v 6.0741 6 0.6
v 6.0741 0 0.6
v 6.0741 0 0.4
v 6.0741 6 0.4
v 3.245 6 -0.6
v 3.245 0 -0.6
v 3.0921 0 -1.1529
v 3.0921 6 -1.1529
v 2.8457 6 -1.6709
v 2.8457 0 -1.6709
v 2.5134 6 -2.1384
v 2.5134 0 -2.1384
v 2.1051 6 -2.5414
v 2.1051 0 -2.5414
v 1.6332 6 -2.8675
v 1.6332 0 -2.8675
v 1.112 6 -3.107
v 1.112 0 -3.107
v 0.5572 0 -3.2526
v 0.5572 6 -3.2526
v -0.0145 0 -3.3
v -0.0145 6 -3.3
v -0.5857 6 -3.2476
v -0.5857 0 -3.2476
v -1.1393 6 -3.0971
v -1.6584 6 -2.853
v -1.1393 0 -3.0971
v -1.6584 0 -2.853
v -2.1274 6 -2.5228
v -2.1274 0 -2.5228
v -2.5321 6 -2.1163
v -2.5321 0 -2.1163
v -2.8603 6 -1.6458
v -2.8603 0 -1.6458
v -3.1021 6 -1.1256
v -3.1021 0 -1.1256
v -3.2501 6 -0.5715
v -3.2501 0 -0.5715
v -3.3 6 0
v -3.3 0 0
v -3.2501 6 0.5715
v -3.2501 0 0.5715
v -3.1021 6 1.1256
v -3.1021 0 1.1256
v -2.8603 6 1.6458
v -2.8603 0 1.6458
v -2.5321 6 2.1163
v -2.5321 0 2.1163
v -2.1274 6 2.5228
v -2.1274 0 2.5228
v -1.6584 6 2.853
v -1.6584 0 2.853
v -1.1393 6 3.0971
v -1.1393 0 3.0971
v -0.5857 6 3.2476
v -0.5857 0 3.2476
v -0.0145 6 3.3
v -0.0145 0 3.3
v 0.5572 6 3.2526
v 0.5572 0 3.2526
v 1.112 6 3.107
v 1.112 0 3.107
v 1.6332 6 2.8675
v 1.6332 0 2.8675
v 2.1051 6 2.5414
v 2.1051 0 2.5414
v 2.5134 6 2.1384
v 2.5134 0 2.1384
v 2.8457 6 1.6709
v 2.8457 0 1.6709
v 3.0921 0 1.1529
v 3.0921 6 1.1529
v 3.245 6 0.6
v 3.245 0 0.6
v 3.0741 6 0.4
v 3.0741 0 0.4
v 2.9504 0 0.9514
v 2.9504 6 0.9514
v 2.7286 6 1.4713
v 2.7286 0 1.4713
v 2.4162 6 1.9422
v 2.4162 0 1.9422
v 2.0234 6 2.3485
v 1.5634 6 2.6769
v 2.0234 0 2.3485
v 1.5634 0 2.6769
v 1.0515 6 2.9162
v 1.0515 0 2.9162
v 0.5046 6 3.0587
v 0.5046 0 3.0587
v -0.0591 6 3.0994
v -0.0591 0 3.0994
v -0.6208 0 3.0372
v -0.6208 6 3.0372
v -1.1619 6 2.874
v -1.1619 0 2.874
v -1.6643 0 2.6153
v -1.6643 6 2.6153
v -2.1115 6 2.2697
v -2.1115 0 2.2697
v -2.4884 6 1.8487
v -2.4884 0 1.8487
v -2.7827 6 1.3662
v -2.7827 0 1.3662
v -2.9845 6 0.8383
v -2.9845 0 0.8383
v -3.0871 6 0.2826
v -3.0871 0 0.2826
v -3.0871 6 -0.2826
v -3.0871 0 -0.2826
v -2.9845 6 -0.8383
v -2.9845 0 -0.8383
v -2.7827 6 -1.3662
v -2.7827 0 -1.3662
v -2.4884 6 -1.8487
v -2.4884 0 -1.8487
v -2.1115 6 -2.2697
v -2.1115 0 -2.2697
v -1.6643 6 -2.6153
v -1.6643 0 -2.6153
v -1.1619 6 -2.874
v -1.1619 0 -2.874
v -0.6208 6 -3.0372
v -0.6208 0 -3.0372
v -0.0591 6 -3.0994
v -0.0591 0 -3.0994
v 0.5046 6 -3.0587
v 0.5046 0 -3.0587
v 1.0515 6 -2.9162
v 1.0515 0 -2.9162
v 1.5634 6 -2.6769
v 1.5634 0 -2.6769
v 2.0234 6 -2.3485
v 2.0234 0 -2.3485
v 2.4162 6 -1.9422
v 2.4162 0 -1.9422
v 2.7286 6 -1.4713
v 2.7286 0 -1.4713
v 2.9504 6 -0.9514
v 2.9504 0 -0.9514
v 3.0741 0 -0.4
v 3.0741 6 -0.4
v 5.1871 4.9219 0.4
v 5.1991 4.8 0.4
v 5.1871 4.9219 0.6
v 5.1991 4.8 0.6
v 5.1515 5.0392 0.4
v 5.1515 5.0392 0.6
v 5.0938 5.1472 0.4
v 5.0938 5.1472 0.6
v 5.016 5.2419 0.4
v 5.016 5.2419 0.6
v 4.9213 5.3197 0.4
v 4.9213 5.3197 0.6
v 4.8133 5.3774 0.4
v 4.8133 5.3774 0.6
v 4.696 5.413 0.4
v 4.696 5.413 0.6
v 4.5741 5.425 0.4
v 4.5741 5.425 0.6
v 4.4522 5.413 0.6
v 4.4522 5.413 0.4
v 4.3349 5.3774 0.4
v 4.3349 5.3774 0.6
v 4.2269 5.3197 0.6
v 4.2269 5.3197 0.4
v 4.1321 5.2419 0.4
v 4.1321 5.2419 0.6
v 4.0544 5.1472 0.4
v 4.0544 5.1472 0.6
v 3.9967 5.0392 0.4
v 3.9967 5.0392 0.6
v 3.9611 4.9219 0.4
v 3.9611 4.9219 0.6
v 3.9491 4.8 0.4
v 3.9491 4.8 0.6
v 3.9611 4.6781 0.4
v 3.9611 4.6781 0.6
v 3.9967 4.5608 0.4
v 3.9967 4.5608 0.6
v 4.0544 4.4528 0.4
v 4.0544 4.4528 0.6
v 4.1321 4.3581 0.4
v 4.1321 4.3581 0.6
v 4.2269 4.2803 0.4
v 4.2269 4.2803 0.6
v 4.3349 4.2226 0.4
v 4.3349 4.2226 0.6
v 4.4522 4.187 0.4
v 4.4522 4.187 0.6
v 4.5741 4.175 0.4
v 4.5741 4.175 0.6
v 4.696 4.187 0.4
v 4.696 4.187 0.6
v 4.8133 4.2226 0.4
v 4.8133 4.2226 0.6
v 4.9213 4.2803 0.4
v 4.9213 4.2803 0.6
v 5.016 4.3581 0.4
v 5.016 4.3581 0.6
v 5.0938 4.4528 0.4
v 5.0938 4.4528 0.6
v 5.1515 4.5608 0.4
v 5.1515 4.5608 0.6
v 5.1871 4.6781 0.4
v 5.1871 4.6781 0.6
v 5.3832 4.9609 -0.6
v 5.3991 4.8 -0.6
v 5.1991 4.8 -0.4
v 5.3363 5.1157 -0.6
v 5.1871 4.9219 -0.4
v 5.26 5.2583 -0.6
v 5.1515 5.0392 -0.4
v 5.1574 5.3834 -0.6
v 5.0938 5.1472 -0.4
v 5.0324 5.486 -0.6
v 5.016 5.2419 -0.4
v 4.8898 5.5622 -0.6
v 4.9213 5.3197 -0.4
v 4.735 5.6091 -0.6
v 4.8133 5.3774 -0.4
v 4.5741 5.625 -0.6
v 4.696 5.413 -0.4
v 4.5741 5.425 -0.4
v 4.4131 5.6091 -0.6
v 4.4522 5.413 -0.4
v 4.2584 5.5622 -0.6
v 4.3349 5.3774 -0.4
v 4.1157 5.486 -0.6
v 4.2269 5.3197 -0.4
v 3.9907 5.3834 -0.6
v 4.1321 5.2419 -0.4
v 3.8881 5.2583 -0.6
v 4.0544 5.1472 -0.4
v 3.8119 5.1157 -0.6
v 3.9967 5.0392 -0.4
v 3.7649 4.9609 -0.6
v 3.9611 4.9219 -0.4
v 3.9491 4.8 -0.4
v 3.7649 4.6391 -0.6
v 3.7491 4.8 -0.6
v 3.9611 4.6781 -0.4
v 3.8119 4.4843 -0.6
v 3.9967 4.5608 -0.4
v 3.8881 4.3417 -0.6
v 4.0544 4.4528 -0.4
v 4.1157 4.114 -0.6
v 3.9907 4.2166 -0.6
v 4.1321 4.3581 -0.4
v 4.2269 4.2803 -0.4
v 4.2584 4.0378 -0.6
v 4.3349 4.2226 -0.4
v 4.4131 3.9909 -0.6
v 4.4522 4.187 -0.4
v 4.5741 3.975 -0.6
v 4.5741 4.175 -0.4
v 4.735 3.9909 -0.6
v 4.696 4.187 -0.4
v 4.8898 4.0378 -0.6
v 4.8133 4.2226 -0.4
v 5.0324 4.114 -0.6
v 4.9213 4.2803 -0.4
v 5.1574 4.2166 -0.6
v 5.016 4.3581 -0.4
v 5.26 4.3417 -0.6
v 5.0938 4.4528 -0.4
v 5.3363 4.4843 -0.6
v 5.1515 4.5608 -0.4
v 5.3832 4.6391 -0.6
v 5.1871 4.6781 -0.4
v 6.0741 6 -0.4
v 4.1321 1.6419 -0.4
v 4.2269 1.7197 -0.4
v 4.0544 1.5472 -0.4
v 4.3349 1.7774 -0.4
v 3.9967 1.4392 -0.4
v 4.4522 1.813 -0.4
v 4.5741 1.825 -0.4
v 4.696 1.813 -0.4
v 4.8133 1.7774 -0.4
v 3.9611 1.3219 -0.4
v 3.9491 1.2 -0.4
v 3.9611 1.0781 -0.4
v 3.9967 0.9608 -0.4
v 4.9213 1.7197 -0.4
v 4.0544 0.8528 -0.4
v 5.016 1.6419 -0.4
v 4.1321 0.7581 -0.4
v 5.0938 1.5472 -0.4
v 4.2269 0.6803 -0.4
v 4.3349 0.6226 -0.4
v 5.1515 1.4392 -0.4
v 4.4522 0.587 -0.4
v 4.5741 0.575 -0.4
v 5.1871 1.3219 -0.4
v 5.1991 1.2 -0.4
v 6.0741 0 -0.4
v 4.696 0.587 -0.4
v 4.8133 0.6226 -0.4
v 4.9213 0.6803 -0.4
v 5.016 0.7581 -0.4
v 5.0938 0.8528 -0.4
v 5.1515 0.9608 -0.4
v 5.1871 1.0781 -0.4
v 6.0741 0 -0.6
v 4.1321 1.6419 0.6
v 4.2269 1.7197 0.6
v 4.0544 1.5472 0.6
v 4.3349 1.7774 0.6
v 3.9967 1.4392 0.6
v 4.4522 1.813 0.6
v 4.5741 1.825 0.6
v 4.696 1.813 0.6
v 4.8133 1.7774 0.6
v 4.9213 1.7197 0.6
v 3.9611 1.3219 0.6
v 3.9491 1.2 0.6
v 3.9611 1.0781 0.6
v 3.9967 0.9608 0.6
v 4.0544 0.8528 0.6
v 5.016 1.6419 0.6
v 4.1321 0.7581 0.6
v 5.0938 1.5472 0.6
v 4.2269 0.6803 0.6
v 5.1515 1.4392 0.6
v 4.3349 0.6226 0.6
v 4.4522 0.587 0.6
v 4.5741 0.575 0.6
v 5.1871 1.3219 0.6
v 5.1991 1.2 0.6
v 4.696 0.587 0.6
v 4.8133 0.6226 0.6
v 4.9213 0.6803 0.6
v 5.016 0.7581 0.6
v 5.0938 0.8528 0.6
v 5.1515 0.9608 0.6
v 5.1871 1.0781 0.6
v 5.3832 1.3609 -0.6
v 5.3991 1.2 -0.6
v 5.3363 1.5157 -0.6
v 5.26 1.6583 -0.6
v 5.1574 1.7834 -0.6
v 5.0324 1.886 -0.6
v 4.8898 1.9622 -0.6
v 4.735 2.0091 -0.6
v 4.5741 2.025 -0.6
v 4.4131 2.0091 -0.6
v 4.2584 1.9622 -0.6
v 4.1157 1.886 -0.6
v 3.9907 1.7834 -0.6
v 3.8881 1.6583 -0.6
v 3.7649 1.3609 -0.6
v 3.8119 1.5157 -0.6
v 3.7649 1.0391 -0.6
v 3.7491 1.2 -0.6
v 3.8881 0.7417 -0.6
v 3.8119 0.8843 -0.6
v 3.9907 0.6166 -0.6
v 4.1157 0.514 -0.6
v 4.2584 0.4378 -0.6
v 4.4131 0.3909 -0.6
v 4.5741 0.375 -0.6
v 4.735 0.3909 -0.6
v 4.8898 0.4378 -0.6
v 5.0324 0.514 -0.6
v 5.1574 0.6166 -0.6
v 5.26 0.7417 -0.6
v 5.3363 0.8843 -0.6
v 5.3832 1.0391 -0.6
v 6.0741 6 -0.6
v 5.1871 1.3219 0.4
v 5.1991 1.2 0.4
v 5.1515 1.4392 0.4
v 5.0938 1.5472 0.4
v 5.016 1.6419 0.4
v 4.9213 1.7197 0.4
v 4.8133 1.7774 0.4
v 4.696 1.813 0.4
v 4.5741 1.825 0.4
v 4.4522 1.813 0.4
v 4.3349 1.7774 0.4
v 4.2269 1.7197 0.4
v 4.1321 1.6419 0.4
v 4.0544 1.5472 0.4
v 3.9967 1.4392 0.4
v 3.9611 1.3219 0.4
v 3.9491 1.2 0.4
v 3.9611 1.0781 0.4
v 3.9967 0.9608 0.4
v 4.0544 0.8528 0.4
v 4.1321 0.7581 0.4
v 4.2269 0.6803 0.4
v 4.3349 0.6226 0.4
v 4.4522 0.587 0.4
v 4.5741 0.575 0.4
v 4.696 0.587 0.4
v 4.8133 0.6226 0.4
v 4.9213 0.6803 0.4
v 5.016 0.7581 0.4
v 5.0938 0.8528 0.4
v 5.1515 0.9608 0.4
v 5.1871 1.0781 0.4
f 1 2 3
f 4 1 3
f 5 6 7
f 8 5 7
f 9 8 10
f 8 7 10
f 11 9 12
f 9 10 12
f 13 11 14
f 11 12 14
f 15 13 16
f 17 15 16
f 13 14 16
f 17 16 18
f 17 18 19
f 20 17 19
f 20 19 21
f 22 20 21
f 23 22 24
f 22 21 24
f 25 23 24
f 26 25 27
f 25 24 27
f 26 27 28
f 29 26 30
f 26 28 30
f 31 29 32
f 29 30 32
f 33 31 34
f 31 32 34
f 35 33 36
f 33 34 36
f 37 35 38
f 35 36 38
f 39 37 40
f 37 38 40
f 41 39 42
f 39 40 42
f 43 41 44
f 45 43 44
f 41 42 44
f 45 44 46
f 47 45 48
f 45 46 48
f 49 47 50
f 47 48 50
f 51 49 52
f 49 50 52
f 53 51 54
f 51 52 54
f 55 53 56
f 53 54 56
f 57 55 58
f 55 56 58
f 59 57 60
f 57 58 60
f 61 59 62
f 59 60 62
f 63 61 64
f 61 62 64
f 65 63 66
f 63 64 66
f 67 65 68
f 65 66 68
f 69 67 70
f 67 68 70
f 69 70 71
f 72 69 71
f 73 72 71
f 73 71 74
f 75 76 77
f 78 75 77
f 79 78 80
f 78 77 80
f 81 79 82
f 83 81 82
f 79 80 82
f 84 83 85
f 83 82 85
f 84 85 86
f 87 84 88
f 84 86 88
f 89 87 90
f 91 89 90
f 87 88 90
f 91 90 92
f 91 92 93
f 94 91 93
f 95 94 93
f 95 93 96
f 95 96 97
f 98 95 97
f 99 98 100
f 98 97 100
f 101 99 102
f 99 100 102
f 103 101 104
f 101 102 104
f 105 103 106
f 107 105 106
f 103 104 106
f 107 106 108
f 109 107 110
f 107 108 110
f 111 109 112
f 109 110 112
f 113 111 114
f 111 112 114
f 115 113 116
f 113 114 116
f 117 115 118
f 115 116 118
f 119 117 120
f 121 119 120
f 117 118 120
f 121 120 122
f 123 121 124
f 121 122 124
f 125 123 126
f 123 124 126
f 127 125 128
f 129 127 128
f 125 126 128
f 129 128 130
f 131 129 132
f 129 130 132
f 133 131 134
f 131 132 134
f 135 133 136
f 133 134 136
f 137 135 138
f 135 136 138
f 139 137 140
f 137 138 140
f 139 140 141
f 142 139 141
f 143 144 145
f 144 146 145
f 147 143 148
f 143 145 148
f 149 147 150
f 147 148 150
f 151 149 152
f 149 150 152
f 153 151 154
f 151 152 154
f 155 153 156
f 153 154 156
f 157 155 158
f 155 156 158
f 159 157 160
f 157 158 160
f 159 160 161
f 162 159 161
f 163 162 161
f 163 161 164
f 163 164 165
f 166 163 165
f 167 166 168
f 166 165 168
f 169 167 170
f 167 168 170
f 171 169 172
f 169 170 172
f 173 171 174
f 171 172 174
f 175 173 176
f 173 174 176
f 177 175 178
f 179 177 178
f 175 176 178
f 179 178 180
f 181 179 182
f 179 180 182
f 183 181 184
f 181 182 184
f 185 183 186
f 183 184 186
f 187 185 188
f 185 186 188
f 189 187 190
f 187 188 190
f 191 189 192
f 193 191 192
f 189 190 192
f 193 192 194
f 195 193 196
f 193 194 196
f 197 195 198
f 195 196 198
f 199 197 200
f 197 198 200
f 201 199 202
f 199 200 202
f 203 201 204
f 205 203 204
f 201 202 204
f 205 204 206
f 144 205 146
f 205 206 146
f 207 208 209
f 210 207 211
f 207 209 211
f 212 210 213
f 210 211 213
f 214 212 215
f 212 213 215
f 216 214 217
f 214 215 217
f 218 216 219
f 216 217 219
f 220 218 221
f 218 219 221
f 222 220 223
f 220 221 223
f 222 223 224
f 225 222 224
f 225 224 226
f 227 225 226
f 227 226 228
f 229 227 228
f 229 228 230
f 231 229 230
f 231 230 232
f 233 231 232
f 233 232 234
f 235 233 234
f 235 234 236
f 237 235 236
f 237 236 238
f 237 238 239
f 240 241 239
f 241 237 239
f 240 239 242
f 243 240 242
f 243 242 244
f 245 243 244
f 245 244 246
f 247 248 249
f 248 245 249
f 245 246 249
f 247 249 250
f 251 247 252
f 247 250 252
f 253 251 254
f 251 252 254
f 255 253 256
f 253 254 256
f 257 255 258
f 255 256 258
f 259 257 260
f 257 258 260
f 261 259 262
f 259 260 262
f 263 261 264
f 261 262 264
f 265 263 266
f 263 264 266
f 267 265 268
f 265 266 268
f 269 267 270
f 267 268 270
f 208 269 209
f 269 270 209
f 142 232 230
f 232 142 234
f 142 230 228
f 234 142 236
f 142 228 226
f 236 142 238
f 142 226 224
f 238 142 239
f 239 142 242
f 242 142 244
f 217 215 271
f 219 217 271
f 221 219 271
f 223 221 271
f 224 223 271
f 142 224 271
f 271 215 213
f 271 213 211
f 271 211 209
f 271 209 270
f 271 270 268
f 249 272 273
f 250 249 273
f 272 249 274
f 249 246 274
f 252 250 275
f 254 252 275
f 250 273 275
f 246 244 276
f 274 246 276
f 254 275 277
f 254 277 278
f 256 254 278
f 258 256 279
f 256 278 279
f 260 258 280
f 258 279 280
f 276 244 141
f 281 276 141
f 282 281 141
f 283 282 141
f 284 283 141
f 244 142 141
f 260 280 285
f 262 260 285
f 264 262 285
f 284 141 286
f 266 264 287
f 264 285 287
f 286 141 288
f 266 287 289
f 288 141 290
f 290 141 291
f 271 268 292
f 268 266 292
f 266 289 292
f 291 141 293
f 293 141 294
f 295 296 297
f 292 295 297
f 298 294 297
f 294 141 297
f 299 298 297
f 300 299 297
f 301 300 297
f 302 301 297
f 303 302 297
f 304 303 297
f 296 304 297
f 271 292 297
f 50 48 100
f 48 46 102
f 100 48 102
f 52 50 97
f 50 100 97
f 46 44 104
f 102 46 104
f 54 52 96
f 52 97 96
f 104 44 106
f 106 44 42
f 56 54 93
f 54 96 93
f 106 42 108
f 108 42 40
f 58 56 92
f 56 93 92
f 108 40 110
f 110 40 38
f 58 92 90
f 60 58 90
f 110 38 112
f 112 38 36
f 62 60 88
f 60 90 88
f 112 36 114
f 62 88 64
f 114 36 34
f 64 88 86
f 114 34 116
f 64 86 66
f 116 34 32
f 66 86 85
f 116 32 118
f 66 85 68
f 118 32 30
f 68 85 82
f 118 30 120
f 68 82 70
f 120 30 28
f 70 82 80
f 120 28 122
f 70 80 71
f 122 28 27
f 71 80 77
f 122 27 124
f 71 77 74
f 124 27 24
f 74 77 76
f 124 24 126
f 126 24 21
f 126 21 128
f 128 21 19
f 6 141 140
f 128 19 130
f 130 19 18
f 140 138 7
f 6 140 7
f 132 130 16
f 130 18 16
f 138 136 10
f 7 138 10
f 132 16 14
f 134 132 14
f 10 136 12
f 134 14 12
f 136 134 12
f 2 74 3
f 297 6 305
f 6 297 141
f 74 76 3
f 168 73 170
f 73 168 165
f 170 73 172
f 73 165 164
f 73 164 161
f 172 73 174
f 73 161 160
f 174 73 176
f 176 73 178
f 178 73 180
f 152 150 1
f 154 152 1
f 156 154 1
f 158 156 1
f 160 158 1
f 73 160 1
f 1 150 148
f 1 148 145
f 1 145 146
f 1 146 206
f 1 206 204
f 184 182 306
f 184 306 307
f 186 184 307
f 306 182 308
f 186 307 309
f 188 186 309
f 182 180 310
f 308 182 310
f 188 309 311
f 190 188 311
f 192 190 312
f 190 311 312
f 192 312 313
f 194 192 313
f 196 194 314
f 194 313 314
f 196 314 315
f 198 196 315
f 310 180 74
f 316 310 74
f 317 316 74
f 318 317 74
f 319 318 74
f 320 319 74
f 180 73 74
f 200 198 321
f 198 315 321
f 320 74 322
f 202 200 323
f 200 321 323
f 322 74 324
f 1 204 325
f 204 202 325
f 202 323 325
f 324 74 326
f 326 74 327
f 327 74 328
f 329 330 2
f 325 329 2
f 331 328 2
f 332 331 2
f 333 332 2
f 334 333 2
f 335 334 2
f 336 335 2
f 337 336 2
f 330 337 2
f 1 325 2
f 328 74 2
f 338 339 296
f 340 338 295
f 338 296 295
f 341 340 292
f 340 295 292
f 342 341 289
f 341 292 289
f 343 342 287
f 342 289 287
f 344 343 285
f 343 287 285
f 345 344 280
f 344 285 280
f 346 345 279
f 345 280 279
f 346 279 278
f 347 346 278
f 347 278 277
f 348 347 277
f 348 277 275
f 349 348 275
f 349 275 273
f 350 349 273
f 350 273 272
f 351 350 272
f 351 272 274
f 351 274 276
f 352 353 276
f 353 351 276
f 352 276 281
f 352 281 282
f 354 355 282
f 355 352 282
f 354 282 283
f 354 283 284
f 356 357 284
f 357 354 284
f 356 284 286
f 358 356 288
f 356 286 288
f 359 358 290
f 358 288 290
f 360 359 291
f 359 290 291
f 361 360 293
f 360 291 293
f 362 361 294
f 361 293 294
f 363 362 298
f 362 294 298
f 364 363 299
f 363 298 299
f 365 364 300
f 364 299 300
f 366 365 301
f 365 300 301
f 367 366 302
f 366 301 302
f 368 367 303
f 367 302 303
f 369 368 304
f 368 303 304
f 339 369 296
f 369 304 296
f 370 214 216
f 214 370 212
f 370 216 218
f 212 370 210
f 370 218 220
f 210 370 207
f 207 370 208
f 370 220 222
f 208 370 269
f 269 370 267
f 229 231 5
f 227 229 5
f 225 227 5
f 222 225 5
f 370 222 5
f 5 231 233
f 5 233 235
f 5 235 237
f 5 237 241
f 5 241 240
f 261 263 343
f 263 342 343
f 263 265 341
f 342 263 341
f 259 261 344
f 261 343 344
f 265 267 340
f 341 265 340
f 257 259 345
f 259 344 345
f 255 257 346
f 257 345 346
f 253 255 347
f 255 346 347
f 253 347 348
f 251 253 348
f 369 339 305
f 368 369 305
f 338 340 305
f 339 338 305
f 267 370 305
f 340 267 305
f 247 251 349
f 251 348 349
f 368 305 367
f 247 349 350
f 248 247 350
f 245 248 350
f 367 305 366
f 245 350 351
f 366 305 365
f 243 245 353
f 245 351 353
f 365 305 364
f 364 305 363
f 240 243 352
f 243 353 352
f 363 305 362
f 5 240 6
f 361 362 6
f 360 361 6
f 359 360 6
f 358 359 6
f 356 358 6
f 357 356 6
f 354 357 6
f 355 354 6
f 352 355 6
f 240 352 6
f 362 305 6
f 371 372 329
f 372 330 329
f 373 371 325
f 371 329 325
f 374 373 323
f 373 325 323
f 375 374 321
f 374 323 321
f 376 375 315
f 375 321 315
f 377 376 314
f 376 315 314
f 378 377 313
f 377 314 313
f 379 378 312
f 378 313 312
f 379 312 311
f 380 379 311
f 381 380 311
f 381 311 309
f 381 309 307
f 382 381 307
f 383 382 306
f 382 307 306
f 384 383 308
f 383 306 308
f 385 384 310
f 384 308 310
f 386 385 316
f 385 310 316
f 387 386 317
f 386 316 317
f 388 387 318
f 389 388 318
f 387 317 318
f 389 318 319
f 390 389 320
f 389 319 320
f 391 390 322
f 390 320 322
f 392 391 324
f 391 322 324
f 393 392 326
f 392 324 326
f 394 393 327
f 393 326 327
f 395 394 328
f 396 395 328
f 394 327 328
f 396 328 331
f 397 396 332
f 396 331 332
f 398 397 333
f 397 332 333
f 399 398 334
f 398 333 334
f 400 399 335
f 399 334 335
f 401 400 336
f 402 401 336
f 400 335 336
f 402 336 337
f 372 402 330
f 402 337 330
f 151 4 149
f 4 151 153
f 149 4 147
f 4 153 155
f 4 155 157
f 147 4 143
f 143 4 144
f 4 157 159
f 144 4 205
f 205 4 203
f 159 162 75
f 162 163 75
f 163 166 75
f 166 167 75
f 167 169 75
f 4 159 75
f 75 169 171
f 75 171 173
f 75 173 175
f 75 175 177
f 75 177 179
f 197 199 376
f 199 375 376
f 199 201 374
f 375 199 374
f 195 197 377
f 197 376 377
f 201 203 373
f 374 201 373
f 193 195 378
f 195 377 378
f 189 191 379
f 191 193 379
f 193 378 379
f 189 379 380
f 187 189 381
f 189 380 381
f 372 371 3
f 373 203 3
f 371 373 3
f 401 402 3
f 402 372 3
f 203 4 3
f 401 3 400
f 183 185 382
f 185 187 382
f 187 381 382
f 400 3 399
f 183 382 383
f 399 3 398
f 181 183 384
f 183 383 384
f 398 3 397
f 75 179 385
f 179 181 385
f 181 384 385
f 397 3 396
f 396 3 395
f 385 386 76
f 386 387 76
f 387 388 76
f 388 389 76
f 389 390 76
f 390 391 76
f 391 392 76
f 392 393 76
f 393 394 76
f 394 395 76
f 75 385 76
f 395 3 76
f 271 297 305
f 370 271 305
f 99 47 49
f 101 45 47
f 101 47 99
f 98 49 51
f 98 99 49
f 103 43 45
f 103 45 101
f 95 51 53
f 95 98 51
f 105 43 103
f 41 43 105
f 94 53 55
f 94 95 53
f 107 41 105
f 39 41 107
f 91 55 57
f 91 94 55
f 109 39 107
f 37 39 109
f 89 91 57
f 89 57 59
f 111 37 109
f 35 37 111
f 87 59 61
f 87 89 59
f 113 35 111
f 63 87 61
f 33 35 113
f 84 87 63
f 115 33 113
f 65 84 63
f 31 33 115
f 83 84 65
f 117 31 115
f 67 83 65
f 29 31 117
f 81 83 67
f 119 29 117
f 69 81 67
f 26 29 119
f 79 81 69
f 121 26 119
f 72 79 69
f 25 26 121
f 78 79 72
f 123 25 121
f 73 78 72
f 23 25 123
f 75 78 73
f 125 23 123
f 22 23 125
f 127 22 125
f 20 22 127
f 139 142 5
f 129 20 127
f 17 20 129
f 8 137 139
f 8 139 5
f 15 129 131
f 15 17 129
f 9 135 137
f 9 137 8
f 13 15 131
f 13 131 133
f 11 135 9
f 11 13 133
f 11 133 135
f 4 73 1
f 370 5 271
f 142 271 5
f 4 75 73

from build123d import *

# Parameters (mm, degrees)
EXTRUDE_1_DEPTH                = 6
HOLE_WIZARD_M1_6_1_D           = 1.25
HOLE_WIZARD_M1_6_1_CSINK_D     = 1.65
HOLE_WIZARD_M1_6_1_CSINK_ANGLE = 90


with BuildPart() as part:
    # 草图2 → 凸台-拉伸1 (new body)
    with BuildSketch(Plane(origin=(0, 0, 0), x_dir=(1, 0, 0), z_dir=(0, 1, 0))):
        with BuildLine():
            Line((3.07408523, 0.4), (6.07408523, 0.4))
            Line((6.07408523, 0.4), (6.07408523, 0.6))
            Line((6.07408523, 0.6), (3.244996148, 0.6))
            ThreePointArc((3.244996148, 0.6), (-3.3, 0), (3.244996148, -0.6))
            Line((3.244996148, -0.6), (6.07408523, -0.6))
            Line((6.07408523, -0.6), (6.07408523, -0.4))
            Line((6.07408523, -0.4), (3.07408523, -0.4))
            ThreePointArc((3.07408523, -0.4), (-3.1, 0), (3.07408523, 0.4))
        make_face()
    extrude(amount=EXTRUDE_1_DEPTH)

    # M1.6 螺纹孔1 (through all)
    with Locations(Plane(origin=(0, 0, -0.6), x_dir=(-1, 0, 0), z_dir=(0, 0, -1))):
        with Locations((-4.57408523, 4.8), (-4.57408523, 1.2)):
            CounterSinkHole(HOLE_WIZARD_M1_6_1_D / 2, HOLE_WIZARD_M1_6_1_CSINK_D / 2, counter_sink_angle=HOLE_WIZARD_M1_6_1_CSINK_ANGLE)


solid = part.part
